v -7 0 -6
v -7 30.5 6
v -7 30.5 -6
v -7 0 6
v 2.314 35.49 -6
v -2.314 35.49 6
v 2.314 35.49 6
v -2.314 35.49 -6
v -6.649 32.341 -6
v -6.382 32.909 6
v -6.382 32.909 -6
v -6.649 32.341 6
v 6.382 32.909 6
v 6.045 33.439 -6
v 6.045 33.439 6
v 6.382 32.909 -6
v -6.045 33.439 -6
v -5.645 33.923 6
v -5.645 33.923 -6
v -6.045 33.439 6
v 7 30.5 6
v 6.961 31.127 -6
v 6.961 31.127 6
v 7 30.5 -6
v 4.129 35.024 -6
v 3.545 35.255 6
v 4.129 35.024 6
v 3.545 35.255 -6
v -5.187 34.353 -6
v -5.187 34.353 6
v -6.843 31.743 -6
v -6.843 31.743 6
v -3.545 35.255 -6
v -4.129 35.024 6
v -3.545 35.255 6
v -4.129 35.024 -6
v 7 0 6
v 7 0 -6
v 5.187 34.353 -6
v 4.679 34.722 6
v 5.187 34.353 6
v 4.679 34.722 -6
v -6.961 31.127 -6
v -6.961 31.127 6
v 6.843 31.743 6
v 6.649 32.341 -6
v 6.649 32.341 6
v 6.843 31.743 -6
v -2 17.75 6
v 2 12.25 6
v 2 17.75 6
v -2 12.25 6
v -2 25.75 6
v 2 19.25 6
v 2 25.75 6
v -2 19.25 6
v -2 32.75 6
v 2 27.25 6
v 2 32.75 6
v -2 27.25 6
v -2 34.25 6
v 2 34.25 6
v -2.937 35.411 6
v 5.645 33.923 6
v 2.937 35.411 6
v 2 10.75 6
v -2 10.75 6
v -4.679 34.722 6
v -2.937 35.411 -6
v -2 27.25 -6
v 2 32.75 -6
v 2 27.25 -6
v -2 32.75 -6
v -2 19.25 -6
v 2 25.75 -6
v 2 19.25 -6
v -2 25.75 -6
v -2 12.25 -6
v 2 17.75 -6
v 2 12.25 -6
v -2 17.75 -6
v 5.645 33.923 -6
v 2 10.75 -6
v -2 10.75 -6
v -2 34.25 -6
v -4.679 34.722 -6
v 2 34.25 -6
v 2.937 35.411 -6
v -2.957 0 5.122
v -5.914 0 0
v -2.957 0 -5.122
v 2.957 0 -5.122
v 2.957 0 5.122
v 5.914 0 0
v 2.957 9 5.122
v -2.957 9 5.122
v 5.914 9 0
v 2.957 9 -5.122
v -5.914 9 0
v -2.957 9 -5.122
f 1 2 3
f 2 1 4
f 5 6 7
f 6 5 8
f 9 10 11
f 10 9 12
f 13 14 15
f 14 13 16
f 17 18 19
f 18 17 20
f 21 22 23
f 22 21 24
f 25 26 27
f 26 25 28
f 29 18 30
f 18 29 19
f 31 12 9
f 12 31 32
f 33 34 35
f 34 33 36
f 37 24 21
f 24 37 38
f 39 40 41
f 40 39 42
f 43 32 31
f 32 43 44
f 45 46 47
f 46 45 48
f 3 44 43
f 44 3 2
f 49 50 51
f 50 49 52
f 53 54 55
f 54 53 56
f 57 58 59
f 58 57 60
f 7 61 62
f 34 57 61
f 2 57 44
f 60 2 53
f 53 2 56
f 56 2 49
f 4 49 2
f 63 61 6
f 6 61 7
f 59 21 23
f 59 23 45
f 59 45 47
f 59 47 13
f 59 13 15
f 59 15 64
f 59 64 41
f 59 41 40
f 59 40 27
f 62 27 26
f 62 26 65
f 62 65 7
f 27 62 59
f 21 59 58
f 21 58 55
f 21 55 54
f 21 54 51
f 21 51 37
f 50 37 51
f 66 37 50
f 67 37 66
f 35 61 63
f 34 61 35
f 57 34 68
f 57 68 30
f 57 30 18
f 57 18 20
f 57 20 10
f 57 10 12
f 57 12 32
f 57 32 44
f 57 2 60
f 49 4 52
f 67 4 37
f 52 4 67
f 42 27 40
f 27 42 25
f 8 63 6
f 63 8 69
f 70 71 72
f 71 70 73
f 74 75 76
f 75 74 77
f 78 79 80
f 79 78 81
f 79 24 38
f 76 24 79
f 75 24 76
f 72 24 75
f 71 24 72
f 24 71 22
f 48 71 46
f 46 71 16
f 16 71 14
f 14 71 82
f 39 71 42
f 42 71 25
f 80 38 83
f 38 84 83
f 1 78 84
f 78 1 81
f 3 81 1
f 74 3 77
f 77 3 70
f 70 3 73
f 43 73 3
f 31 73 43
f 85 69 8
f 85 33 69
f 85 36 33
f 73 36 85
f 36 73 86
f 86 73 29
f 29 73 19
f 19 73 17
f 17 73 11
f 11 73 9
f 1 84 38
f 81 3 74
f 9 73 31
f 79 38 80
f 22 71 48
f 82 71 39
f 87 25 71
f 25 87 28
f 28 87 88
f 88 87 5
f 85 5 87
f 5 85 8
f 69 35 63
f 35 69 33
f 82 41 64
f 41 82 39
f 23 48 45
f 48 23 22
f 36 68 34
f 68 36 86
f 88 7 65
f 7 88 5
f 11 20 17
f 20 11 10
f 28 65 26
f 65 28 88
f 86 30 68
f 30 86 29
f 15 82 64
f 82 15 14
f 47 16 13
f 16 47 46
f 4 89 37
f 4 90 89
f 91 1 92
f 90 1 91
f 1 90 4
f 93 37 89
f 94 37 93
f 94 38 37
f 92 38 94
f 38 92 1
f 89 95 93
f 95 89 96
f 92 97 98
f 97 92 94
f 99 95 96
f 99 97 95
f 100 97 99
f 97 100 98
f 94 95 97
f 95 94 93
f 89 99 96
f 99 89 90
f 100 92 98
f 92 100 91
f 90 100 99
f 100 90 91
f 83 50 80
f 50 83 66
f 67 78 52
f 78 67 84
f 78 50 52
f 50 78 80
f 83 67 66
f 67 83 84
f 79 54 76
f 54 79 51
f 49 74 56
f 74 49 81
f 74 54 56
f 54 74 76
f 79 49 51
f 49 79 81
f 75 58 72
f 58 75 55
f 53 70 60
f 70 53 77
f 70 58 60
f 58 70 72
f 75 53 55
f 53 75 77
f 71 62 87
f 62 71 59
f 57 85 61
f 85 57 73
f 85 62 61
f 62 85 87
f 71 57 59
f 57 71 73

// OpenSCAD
$fn = 50;


difference() {
	union() {
		translate(v = [0, 21.0000000000, -6.0000000000]) {
			hull() {
				translate(v = [-2.0000000000, 9.5000000000, 0]) {
					cylinder(h = 12, r = 5);
				}
				translate(v = [2.0000000000, 9.5000000000, 0]) {
					cylinder(h = 12, r = 5);
				}
				translate(v = [-2.0000000000, -9.5000000000, 0]) {
					cylinder(h = 12, r = 5);
				}
				translate(v = [2.0000000000, -9.5000000000, 0]) {
					cylinder(h = 12, r = 5);
				}
			}
		}
		translate(v = [0, 21.0000000000, -6.0000000000]) {
			hull() {
				translate(v = [-2.0000000000, 9.5000000000, 0]) {
					cylinder(h = 12, r = 5);
				}
				translate(v = [2.0000000000, 9.5000000000, 0]) {
					cylinder(h = 12, r = 5);
				}
				translate(v = [-2.0000000000, -9.5000000000, 0]) {
					cylinder(h = 12, r = 5);
				}
				translate(v = [2.0000000000, -9.5000000000, 0]) {
					cylinder(h = 12, r = 5);
				}
			}
		}
		translate(v = [-7.0000000000, 0, -6.0000000000]) {
			cube(size = [14, 13.5000000000, 12]);
		}
	}
	union() {
		translate(v = [0.0000000000, 9, 0]) {
			rotate(a = [0, 0, 0]) {
				difference() {
					union() {
						rotate(a = [90, 0, 0]) {
							linear_extrude(height = 13.5000000000) {
								polygon(points = [[5.9142500000, 0.0000000000], [2.9571250000, 5.1218907443], [-2.9571250000, 5.1218907443], [-5.9142500000, 0.0000000000], [-2.9571250000, -5.1218907443], [2.9571250000, -5.1218907443]]);
							}
						}
					}
					union();
				}
			}
		}
		translate(v = [-2.0000000000, 10.7500000000, -50]) {
			cube(size = [4, 1.5000000000, 100]);
		}
		translate(v = [-2.0000000000, 17.7500000000, -50]) {
			cube(size = [4, 1.5000000000, 100]);
		}
		translate(v = [-2.0000000000, 25.7500000000, -50]) {
			cube(size = [4, 1.5000000000, 100]);
		}
		translate(v = [-2.0000000000, 32.7500000000, -50]) {
			cube(size = [4, 1.5000000000, 100]);
		}
		translate(v = [0.0000000000, 8, 0]) {
			rotate(a = [90, 0, 0]) {
				cylinder(h = 8, r = 3.2500000000);
			}
		}
	}
}
